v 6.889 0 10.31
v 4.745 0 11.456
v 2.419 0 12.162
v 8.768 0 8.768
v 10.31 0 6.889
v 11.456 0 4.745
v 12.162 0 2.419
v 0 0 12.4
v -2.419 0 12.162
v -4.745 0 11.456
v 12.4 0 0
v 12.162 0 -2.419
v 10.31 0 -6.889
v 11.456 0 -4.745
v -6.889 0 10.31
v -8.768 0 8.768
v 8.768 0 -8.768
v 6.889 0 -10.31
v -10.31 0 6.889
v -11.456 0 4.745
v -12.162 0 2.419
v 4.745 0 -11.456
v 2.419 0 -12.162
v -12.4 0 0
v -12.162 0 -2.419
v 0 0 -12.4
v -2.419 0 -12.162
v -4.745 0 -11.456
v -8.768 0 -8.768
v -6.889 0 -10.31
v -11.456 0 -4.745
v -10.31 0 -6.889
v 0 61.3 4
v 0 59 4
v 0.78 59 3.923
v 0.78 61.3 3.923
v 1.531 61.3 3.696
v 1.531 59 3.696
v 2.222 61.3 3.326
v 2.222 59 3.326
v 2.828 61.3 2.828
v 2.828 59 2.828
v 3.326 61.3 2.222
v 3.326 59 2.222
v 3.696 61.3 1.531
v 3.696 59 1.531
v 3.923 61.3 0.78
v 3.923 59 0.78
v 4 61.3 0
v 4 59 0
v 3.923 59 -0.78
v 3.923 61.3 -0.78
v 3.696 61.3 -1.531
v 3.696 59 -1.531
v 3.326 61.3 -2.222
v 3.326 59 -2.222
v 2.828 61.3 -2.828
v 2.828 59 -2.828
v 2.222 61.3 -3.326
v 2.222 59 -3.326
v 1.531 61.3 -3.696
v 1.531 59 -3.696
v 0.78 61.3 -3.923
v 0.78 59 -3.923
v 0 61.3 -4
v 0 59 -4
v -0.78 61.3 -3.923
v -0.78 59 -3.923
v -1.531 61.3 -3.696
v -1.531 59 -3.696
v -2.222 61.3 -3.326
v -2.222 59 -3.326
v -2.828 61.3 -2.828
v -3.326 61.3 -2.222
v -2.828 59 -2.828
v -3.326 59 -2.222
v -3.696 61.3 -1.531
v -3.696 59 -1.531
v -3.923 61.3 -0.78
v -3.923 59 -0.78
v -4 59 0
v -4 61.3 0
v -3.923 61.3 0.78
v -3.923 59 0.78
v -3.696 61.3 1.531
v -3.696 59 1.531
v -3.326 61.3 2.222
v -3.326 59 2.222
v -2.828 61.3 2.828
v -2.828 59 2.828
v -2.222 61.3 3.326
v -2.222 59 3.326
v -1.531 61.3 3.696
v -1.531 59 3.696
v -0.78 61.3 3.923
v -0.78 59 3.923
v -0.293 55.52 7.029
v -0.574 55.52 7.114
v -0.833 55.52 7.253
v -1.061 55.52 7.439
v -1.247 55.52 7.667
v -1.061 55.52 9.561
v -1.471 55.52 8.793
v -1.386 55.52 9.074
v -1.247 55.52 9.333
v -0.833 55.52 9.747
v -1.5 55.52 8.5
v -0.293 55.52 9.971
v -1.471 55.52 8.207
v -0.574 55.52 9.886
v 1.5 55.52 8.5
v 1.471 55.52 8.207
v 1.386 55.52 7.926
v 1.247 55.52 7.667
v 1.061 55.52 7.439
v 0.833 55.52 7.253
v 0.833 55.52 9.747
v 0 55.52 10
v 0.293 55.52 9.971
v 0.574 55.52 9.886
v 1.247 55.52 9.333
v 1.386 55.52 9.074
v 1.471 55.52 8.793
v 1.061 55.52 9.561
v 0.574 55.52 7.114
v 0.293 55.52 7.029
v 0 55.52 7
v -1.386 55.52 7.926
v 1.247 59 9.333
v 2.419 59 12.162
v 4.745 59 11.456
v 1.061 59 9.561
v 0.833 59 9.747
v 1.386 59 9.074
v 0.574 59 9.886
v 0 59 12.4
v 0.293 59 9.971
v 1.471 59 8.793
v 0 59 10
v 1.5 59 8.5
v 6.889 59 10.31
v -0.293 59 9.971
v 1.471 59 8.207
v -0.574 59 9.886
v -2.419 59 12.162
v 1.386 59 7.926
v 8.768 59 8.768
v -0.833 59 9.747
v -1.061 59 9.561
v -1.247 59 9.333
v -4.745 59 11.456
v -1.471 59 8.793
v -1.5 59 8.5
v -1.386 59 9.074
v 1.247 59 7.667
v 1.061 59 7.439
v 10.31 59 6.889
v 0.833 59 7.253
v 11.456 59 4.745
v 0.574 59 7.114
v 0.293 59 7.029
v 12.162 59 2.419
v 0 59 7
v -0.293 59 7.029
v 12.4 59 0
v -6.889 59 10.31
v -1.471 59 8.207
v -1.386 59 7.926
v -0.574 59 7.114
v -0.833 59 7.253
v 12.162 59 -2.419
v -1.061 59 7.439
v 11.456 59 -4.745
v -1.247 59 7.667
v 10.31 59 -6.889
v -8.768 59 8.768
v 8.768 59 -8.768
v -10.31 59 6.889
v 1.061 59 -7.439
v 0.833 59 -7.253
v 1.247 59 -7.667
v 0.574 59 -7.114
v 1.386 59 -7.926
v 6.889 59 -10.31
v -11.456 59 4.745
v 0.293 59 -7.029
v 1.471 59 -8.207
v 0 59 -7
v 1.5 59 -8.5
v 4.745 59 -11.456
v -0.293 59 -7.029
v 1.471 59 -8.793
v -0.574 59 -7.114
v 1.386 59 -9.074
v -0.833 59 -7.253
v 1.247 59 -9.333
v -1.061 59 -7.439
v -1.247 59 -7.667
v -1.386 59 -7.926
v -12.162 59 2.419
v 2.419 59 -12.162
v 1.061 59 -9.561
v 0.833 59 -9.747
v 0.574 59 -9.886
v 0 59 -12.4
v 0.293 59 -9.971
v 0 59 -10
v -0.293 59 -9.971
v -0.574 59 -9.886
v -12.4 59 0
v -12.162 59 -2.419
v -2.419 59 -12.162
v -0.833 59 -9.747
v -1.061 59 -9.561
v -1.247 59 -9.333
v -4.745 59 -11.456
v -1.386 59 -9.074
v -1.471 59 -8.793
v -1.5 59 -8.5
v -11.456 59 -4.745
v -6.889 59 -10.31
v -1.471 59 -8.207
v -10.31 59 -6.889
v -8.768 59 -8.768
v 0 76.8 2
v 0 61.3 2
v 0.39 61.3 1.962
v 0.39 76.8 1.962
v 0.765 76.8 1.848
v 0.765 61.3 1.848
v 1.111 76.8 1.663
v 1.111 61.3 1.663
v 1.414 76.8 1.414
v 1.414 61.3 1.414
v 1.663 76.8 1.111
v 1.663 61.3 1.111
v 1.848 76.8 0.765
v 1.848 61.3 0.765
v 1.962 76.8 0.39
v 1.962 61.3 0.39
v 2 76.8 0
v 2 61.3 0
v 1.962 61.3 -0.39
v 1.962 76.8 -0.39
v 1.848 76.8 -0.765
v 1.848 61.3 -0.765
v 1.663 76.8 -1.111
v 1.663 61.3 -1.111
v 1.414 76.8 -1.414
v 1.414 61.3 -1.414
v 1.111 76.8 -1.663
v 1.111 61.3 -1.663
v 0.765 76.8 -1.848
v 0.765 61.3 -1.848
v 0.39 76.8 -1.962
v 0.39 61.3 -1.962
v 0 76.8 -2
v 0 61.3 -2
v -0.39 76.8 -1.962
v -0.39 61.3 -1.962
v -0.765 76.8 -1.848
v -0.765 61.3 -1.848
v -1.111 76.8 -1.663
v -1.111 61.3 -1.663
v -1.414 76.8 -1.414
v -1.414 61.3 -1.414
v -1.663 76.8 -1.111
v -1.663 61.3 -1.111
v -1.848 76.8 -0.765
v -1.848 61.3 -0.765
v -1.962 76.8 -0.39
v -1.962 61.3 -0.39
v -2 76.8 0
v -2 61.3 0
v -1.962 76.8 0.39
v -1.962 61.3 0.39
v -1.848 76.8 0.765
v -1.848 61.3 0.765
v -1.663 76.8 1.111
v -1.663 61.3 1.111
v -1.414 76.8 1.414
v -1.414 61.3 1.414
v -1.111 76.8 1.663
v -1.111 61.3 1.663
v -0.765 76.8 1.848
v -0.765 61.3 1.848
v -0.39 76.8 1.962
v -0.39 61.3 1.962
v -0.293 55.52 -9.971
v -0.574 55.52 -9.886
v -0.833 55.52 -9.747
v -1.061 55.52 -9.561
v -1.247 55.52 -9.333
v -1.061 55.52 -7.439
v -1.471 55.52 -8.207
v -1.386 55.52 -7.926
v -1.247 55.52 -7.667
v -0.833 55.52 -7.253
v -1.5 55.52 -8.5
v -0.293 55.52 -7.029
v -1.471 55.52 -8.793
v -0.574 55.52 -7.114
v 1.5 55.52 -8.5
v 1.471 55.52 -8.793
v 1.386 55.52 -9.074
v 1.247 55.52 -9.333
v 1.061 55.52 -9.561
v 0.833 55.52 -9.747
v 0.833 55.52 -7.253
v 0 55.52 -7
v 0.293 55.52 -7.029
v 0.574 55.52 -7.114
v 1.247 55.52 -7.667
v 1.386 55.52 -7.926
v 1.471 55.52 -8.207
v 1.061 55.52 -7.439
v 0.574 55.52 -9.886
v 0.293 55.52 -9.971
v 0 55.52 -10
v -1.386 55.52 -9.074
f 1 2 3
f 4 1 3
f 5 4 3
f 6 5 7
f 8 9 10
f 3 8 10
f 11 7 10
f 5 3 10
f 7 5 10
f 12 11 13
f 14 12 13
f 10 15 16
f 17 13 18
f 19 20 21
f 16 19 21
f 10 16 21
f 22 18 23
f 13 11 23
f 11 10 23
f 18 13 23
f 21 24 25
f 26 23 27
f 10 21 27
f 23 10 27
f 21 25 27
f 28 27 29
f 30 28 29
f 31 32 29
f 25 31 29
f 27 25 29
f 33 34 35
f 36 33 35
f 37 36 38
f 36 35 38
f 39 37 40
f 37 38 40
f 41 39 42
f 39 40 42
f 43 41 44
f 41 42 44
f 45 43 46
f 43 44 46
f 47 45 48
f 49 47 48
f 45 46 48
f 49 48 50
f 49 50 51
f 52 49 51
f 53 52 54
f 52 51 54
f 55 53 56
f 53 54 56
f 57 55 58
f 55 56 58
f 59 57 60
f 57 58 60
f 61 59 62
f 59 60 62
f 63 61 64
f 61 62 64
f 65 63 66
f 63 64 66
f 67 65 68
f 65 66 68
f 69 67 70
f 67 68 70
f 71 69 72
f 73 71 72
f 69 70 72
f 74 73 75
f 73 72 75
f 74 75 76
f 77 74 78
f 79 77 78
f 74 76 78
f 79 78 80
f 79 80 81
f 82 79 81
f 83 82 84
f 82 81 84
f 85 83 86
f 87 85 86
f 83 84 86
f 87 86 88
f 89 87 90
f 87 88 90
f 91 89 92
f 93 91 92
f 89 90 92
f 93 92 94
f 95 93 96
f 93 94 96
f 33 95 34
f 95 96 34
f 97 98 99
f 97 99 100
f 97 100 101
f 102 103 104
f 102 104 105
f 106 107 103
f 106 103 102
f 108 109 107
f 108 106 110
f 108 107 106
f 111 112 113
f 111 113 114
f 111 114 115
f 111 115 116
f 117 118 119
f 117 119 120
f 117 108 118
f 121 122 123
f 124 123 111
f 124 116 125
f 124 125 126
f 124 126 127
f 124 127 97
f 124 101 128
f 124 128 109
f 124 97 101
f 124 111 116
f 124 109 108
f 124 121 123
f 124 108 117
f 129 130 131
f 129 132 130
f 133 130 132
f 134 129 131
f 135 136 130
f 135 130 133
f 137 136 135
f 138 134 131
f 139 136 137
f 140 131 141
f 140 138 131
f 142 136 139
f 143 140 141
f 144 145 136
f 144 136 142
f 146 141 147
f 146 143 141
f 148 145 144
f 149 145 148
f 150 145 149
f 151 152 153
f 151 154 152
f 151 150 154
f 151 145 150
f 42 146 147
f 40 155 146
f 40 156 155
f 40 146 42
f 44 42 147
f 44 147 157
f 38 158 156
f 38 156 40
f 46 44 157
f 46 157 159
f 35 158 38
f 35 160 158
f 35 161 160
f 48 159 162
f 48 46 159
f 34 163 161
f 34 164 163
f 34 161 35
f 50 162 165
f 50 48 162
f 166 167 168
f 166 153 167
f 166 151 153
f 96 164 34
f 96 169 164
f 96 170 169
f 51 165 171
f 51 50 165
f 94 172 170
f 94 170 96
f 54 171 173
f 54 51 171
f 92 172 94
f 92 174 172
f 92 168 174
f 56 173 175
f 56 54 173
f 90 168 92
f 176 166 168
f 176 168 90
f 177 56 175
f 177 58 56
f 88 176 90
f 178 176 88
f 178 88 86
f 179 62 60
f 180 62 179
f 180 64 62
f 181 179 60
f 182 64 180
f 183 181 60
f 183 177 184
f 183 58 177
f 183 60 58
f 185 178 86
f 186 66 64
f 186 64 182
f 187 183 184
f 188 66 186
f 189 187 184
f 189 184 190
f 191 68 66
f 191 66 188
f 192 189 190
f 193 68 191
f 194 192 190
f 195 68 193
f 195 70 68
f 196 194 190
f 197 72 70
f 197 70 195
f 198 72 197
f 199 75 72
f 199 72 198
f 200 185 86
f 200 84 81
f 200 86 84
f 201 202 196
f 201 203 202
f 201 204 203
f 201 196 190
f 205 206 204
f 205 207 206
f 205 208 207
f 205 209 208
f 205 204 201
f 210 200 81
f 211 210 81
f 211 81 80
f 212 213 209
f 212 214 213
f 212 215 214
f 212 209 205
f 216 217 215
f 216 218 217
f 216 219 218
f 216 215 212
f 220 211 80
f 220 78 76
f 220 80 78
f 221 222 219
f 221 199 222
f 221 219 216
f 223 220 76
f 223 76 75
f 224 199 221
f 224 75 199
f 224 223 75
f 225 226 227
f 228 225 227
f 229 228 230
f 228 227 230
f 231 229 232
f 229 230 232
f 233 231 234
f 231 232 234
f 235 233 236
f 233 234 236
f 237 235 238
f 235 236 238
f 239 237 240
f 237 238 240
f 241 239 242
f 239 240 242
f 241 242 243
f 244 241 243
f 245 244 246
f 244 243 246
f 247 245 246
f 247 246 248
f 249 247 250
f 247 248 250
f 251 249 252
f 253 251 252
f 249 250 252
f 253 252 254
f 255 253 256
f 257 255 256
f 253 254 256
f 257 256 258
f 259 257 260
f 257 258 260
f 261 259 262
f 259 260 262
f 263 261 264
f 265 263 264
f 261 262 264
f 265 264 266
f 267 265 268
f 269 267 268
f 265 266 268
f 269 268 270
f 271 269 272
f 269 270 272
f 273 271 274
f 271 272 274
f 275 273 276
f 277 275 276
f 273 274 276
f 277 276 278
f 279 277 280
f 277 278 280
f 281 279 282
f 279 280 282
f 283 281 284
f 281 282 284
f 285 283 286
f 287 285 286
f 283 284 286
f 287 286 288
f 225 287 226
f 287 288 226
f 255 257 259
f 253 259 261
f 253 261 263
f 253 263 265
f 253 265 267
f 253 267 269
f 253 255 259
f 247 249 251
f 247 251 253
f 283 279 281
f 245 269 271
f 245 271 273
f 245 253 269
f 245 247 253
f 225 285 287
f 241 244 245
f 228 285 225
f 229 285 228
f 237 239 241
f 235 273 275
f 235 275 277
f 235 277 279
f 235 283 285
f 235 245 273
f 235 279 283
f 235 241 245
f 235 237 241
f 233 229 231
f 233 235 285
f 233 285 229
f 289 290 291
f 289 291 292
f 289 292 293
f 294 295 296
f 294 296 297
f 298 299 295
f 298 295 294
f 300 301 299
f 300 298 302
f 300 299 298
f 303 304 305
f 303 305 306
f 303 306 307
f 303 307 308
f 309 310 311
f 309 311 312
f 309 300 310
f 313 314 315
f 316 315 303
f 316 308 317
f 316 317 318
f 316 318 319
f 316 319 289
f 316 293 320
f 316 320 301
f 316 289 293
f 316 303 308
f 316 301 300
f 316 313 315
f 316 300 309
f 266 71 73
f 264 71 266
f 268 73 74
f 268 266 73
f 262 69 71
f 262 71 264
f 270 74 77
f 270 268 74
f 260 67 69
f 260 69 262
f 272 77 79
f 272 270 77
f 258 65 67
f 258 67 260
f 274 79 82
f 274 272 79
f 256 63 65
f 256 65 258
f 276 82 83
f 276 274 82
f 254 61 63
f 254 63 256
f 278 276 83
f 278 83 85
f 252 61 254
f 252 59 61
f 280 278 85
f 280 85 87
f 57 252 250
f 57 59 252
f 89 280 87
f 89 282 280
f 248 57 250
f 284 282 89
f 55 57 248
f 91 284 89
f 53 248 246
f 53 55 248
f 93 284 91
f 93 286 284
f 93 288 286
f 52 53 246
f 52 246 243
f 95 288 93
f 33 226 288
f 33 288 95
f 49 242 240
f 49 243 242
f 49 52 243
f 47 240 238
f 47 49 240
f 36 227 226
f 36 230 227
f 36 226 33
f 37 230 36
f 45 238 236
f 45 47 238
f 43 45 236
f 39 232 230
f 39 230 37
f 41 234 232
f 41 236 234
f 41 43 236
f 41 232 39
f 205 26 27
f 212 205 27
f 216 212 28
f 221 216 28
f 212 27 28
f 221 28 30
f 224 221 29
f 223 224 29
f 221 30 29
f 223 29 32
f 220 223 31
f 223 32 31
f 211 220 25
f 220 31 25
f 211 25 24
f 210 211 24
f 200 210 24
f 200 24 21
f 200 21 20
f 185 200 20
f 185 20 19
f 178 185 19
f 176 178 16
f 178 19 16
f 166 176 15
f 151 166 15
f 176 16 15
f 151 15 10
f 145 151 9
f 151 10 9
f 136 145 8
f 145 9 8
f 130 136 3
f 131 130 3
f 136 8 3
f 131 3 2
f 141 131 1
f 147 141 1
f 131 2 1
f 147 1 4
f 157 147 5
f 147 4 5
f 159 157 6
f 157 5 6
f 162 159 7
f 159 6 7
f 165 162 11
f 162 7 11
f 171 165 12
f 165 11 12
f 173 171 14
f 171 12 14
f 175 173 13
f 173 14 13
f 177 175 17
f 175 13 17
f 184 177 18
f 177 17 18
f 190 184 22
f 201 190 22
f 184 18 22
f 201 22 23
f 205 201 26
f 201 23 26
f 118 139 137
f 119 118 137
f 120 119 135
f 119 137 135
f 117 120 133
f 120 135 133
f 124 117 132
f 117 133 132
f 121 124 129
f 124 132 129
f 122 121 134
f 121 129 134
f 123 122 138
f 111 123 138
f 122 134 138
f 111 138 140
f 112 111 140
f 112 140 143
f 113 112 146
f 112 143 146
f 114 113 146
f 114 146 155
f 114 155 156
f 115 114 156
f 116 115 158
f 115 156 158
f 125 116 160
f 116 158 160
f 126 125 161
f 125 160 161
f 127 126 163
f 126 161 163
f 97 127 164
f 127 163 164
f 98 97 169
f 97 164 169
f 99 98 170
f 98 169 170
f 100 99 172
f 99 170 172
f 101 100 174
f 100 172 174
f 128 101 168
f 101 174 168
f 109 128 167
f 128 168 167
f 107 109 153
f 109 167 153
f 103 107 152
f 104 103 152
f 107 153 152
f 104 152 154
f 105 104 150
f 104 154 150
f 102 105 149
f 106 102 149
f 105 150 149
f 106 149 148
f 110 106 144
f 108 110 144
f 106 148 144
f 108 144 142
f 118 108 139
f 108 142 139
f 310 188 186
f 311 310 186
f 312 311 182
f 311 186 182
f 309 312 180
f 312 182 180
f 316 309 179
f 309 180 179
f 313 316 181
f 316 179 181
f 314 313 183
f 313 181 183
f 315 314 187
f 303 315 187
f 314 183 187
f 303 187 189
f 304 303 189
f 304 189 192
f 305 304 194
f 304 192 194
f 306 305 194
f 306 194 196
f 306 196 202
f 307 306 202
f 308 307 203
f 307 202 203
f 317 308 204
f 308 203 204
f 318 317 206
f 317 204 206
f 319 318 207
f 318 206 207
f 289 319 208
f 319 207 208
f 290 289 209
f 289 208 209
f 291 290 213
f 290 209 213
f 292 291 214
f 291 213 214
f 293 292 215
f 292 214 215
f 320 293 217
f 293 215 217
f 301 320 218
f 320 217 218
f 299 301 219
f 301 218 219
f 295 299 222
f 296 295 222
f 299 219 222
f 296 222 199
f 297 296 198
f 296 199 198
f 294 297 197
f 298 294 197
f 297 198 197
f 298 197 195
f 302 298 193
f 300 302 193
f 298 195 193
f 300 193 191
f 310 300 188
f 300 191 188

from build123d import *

# Parameters (mm, degrees)
SKETCH1_R           = 12.4
BOSS_EXTRUDE1_DEPTH = 59
SKETCH2_R           = 1.5
CUT_EXTRUDE1_DEPTH  = 3.4798
SKETCH4_R           = 4
BOSS_EXTRUDE3_DEPTH = 2.3
SKETCH5_R           = 2
BOSS_EXTRUDE4_DEPTH = 15.5


with BuildPart() as part:
    # Sketch1 → Boss-Extrude1 (new body)
    with BuildSketch(Plane(origin=(0, 0, 0), x_dir=(1, 0, 0), z_dir=(0, 1, 0))):
        with Locations(Location((0, 0, 0), (0, 0, 90))):
            Circle(SKETCH1_R)
    extrude(amount=BOSS_EXTRUDE1_DEPTH)

    # Sketch2 → Cut-Extrude1 (cut)
    with BuildSketch(Plane(origin=(0, 59, 0), x_dir=(1, 0, 0), z_dir=(0, 1, 0))):
        with Locations(Location((0, 8.5, 0), (0, 0, 270))):
            Circle(SKETCH2_R)
        with Locations(Location((0, -8.5, 0), (0, 0, 270))):
            Circle(SKETCH2_R)
    extrude(amount=-CUT_EXTRUDE1_DEPTH, mode=Mode.SUBTRACT)

    # Sketch4 → Boss-Extrude3 (add)
    with BuildSketch(Plane(origin=(0, 59, 0), x_dir=(1, 0, 0), z_dir=(0, 1, 0))):
        with Locations(Location((0, 0, 0), (0, 0, 270))):
            Circle(SKETCH4_R)
    extrude(amount=BOSS_EXTRUDE3_DEPTH)

    # Sketch5 → Boss-Extrude4 (add)
    with BuildSketch(Plane(origin=(0, 61.3, 0), x_dir=(1, 0, 0), z_dir=(0, 1, 0))):
        with Locations(Location((0, 0, 0), (0, 0, 270))):
            Circle(SKETCH5_R)
    extrude(amount=BOSS_EXTRUDE4_DEPTH)


solid = part.part
